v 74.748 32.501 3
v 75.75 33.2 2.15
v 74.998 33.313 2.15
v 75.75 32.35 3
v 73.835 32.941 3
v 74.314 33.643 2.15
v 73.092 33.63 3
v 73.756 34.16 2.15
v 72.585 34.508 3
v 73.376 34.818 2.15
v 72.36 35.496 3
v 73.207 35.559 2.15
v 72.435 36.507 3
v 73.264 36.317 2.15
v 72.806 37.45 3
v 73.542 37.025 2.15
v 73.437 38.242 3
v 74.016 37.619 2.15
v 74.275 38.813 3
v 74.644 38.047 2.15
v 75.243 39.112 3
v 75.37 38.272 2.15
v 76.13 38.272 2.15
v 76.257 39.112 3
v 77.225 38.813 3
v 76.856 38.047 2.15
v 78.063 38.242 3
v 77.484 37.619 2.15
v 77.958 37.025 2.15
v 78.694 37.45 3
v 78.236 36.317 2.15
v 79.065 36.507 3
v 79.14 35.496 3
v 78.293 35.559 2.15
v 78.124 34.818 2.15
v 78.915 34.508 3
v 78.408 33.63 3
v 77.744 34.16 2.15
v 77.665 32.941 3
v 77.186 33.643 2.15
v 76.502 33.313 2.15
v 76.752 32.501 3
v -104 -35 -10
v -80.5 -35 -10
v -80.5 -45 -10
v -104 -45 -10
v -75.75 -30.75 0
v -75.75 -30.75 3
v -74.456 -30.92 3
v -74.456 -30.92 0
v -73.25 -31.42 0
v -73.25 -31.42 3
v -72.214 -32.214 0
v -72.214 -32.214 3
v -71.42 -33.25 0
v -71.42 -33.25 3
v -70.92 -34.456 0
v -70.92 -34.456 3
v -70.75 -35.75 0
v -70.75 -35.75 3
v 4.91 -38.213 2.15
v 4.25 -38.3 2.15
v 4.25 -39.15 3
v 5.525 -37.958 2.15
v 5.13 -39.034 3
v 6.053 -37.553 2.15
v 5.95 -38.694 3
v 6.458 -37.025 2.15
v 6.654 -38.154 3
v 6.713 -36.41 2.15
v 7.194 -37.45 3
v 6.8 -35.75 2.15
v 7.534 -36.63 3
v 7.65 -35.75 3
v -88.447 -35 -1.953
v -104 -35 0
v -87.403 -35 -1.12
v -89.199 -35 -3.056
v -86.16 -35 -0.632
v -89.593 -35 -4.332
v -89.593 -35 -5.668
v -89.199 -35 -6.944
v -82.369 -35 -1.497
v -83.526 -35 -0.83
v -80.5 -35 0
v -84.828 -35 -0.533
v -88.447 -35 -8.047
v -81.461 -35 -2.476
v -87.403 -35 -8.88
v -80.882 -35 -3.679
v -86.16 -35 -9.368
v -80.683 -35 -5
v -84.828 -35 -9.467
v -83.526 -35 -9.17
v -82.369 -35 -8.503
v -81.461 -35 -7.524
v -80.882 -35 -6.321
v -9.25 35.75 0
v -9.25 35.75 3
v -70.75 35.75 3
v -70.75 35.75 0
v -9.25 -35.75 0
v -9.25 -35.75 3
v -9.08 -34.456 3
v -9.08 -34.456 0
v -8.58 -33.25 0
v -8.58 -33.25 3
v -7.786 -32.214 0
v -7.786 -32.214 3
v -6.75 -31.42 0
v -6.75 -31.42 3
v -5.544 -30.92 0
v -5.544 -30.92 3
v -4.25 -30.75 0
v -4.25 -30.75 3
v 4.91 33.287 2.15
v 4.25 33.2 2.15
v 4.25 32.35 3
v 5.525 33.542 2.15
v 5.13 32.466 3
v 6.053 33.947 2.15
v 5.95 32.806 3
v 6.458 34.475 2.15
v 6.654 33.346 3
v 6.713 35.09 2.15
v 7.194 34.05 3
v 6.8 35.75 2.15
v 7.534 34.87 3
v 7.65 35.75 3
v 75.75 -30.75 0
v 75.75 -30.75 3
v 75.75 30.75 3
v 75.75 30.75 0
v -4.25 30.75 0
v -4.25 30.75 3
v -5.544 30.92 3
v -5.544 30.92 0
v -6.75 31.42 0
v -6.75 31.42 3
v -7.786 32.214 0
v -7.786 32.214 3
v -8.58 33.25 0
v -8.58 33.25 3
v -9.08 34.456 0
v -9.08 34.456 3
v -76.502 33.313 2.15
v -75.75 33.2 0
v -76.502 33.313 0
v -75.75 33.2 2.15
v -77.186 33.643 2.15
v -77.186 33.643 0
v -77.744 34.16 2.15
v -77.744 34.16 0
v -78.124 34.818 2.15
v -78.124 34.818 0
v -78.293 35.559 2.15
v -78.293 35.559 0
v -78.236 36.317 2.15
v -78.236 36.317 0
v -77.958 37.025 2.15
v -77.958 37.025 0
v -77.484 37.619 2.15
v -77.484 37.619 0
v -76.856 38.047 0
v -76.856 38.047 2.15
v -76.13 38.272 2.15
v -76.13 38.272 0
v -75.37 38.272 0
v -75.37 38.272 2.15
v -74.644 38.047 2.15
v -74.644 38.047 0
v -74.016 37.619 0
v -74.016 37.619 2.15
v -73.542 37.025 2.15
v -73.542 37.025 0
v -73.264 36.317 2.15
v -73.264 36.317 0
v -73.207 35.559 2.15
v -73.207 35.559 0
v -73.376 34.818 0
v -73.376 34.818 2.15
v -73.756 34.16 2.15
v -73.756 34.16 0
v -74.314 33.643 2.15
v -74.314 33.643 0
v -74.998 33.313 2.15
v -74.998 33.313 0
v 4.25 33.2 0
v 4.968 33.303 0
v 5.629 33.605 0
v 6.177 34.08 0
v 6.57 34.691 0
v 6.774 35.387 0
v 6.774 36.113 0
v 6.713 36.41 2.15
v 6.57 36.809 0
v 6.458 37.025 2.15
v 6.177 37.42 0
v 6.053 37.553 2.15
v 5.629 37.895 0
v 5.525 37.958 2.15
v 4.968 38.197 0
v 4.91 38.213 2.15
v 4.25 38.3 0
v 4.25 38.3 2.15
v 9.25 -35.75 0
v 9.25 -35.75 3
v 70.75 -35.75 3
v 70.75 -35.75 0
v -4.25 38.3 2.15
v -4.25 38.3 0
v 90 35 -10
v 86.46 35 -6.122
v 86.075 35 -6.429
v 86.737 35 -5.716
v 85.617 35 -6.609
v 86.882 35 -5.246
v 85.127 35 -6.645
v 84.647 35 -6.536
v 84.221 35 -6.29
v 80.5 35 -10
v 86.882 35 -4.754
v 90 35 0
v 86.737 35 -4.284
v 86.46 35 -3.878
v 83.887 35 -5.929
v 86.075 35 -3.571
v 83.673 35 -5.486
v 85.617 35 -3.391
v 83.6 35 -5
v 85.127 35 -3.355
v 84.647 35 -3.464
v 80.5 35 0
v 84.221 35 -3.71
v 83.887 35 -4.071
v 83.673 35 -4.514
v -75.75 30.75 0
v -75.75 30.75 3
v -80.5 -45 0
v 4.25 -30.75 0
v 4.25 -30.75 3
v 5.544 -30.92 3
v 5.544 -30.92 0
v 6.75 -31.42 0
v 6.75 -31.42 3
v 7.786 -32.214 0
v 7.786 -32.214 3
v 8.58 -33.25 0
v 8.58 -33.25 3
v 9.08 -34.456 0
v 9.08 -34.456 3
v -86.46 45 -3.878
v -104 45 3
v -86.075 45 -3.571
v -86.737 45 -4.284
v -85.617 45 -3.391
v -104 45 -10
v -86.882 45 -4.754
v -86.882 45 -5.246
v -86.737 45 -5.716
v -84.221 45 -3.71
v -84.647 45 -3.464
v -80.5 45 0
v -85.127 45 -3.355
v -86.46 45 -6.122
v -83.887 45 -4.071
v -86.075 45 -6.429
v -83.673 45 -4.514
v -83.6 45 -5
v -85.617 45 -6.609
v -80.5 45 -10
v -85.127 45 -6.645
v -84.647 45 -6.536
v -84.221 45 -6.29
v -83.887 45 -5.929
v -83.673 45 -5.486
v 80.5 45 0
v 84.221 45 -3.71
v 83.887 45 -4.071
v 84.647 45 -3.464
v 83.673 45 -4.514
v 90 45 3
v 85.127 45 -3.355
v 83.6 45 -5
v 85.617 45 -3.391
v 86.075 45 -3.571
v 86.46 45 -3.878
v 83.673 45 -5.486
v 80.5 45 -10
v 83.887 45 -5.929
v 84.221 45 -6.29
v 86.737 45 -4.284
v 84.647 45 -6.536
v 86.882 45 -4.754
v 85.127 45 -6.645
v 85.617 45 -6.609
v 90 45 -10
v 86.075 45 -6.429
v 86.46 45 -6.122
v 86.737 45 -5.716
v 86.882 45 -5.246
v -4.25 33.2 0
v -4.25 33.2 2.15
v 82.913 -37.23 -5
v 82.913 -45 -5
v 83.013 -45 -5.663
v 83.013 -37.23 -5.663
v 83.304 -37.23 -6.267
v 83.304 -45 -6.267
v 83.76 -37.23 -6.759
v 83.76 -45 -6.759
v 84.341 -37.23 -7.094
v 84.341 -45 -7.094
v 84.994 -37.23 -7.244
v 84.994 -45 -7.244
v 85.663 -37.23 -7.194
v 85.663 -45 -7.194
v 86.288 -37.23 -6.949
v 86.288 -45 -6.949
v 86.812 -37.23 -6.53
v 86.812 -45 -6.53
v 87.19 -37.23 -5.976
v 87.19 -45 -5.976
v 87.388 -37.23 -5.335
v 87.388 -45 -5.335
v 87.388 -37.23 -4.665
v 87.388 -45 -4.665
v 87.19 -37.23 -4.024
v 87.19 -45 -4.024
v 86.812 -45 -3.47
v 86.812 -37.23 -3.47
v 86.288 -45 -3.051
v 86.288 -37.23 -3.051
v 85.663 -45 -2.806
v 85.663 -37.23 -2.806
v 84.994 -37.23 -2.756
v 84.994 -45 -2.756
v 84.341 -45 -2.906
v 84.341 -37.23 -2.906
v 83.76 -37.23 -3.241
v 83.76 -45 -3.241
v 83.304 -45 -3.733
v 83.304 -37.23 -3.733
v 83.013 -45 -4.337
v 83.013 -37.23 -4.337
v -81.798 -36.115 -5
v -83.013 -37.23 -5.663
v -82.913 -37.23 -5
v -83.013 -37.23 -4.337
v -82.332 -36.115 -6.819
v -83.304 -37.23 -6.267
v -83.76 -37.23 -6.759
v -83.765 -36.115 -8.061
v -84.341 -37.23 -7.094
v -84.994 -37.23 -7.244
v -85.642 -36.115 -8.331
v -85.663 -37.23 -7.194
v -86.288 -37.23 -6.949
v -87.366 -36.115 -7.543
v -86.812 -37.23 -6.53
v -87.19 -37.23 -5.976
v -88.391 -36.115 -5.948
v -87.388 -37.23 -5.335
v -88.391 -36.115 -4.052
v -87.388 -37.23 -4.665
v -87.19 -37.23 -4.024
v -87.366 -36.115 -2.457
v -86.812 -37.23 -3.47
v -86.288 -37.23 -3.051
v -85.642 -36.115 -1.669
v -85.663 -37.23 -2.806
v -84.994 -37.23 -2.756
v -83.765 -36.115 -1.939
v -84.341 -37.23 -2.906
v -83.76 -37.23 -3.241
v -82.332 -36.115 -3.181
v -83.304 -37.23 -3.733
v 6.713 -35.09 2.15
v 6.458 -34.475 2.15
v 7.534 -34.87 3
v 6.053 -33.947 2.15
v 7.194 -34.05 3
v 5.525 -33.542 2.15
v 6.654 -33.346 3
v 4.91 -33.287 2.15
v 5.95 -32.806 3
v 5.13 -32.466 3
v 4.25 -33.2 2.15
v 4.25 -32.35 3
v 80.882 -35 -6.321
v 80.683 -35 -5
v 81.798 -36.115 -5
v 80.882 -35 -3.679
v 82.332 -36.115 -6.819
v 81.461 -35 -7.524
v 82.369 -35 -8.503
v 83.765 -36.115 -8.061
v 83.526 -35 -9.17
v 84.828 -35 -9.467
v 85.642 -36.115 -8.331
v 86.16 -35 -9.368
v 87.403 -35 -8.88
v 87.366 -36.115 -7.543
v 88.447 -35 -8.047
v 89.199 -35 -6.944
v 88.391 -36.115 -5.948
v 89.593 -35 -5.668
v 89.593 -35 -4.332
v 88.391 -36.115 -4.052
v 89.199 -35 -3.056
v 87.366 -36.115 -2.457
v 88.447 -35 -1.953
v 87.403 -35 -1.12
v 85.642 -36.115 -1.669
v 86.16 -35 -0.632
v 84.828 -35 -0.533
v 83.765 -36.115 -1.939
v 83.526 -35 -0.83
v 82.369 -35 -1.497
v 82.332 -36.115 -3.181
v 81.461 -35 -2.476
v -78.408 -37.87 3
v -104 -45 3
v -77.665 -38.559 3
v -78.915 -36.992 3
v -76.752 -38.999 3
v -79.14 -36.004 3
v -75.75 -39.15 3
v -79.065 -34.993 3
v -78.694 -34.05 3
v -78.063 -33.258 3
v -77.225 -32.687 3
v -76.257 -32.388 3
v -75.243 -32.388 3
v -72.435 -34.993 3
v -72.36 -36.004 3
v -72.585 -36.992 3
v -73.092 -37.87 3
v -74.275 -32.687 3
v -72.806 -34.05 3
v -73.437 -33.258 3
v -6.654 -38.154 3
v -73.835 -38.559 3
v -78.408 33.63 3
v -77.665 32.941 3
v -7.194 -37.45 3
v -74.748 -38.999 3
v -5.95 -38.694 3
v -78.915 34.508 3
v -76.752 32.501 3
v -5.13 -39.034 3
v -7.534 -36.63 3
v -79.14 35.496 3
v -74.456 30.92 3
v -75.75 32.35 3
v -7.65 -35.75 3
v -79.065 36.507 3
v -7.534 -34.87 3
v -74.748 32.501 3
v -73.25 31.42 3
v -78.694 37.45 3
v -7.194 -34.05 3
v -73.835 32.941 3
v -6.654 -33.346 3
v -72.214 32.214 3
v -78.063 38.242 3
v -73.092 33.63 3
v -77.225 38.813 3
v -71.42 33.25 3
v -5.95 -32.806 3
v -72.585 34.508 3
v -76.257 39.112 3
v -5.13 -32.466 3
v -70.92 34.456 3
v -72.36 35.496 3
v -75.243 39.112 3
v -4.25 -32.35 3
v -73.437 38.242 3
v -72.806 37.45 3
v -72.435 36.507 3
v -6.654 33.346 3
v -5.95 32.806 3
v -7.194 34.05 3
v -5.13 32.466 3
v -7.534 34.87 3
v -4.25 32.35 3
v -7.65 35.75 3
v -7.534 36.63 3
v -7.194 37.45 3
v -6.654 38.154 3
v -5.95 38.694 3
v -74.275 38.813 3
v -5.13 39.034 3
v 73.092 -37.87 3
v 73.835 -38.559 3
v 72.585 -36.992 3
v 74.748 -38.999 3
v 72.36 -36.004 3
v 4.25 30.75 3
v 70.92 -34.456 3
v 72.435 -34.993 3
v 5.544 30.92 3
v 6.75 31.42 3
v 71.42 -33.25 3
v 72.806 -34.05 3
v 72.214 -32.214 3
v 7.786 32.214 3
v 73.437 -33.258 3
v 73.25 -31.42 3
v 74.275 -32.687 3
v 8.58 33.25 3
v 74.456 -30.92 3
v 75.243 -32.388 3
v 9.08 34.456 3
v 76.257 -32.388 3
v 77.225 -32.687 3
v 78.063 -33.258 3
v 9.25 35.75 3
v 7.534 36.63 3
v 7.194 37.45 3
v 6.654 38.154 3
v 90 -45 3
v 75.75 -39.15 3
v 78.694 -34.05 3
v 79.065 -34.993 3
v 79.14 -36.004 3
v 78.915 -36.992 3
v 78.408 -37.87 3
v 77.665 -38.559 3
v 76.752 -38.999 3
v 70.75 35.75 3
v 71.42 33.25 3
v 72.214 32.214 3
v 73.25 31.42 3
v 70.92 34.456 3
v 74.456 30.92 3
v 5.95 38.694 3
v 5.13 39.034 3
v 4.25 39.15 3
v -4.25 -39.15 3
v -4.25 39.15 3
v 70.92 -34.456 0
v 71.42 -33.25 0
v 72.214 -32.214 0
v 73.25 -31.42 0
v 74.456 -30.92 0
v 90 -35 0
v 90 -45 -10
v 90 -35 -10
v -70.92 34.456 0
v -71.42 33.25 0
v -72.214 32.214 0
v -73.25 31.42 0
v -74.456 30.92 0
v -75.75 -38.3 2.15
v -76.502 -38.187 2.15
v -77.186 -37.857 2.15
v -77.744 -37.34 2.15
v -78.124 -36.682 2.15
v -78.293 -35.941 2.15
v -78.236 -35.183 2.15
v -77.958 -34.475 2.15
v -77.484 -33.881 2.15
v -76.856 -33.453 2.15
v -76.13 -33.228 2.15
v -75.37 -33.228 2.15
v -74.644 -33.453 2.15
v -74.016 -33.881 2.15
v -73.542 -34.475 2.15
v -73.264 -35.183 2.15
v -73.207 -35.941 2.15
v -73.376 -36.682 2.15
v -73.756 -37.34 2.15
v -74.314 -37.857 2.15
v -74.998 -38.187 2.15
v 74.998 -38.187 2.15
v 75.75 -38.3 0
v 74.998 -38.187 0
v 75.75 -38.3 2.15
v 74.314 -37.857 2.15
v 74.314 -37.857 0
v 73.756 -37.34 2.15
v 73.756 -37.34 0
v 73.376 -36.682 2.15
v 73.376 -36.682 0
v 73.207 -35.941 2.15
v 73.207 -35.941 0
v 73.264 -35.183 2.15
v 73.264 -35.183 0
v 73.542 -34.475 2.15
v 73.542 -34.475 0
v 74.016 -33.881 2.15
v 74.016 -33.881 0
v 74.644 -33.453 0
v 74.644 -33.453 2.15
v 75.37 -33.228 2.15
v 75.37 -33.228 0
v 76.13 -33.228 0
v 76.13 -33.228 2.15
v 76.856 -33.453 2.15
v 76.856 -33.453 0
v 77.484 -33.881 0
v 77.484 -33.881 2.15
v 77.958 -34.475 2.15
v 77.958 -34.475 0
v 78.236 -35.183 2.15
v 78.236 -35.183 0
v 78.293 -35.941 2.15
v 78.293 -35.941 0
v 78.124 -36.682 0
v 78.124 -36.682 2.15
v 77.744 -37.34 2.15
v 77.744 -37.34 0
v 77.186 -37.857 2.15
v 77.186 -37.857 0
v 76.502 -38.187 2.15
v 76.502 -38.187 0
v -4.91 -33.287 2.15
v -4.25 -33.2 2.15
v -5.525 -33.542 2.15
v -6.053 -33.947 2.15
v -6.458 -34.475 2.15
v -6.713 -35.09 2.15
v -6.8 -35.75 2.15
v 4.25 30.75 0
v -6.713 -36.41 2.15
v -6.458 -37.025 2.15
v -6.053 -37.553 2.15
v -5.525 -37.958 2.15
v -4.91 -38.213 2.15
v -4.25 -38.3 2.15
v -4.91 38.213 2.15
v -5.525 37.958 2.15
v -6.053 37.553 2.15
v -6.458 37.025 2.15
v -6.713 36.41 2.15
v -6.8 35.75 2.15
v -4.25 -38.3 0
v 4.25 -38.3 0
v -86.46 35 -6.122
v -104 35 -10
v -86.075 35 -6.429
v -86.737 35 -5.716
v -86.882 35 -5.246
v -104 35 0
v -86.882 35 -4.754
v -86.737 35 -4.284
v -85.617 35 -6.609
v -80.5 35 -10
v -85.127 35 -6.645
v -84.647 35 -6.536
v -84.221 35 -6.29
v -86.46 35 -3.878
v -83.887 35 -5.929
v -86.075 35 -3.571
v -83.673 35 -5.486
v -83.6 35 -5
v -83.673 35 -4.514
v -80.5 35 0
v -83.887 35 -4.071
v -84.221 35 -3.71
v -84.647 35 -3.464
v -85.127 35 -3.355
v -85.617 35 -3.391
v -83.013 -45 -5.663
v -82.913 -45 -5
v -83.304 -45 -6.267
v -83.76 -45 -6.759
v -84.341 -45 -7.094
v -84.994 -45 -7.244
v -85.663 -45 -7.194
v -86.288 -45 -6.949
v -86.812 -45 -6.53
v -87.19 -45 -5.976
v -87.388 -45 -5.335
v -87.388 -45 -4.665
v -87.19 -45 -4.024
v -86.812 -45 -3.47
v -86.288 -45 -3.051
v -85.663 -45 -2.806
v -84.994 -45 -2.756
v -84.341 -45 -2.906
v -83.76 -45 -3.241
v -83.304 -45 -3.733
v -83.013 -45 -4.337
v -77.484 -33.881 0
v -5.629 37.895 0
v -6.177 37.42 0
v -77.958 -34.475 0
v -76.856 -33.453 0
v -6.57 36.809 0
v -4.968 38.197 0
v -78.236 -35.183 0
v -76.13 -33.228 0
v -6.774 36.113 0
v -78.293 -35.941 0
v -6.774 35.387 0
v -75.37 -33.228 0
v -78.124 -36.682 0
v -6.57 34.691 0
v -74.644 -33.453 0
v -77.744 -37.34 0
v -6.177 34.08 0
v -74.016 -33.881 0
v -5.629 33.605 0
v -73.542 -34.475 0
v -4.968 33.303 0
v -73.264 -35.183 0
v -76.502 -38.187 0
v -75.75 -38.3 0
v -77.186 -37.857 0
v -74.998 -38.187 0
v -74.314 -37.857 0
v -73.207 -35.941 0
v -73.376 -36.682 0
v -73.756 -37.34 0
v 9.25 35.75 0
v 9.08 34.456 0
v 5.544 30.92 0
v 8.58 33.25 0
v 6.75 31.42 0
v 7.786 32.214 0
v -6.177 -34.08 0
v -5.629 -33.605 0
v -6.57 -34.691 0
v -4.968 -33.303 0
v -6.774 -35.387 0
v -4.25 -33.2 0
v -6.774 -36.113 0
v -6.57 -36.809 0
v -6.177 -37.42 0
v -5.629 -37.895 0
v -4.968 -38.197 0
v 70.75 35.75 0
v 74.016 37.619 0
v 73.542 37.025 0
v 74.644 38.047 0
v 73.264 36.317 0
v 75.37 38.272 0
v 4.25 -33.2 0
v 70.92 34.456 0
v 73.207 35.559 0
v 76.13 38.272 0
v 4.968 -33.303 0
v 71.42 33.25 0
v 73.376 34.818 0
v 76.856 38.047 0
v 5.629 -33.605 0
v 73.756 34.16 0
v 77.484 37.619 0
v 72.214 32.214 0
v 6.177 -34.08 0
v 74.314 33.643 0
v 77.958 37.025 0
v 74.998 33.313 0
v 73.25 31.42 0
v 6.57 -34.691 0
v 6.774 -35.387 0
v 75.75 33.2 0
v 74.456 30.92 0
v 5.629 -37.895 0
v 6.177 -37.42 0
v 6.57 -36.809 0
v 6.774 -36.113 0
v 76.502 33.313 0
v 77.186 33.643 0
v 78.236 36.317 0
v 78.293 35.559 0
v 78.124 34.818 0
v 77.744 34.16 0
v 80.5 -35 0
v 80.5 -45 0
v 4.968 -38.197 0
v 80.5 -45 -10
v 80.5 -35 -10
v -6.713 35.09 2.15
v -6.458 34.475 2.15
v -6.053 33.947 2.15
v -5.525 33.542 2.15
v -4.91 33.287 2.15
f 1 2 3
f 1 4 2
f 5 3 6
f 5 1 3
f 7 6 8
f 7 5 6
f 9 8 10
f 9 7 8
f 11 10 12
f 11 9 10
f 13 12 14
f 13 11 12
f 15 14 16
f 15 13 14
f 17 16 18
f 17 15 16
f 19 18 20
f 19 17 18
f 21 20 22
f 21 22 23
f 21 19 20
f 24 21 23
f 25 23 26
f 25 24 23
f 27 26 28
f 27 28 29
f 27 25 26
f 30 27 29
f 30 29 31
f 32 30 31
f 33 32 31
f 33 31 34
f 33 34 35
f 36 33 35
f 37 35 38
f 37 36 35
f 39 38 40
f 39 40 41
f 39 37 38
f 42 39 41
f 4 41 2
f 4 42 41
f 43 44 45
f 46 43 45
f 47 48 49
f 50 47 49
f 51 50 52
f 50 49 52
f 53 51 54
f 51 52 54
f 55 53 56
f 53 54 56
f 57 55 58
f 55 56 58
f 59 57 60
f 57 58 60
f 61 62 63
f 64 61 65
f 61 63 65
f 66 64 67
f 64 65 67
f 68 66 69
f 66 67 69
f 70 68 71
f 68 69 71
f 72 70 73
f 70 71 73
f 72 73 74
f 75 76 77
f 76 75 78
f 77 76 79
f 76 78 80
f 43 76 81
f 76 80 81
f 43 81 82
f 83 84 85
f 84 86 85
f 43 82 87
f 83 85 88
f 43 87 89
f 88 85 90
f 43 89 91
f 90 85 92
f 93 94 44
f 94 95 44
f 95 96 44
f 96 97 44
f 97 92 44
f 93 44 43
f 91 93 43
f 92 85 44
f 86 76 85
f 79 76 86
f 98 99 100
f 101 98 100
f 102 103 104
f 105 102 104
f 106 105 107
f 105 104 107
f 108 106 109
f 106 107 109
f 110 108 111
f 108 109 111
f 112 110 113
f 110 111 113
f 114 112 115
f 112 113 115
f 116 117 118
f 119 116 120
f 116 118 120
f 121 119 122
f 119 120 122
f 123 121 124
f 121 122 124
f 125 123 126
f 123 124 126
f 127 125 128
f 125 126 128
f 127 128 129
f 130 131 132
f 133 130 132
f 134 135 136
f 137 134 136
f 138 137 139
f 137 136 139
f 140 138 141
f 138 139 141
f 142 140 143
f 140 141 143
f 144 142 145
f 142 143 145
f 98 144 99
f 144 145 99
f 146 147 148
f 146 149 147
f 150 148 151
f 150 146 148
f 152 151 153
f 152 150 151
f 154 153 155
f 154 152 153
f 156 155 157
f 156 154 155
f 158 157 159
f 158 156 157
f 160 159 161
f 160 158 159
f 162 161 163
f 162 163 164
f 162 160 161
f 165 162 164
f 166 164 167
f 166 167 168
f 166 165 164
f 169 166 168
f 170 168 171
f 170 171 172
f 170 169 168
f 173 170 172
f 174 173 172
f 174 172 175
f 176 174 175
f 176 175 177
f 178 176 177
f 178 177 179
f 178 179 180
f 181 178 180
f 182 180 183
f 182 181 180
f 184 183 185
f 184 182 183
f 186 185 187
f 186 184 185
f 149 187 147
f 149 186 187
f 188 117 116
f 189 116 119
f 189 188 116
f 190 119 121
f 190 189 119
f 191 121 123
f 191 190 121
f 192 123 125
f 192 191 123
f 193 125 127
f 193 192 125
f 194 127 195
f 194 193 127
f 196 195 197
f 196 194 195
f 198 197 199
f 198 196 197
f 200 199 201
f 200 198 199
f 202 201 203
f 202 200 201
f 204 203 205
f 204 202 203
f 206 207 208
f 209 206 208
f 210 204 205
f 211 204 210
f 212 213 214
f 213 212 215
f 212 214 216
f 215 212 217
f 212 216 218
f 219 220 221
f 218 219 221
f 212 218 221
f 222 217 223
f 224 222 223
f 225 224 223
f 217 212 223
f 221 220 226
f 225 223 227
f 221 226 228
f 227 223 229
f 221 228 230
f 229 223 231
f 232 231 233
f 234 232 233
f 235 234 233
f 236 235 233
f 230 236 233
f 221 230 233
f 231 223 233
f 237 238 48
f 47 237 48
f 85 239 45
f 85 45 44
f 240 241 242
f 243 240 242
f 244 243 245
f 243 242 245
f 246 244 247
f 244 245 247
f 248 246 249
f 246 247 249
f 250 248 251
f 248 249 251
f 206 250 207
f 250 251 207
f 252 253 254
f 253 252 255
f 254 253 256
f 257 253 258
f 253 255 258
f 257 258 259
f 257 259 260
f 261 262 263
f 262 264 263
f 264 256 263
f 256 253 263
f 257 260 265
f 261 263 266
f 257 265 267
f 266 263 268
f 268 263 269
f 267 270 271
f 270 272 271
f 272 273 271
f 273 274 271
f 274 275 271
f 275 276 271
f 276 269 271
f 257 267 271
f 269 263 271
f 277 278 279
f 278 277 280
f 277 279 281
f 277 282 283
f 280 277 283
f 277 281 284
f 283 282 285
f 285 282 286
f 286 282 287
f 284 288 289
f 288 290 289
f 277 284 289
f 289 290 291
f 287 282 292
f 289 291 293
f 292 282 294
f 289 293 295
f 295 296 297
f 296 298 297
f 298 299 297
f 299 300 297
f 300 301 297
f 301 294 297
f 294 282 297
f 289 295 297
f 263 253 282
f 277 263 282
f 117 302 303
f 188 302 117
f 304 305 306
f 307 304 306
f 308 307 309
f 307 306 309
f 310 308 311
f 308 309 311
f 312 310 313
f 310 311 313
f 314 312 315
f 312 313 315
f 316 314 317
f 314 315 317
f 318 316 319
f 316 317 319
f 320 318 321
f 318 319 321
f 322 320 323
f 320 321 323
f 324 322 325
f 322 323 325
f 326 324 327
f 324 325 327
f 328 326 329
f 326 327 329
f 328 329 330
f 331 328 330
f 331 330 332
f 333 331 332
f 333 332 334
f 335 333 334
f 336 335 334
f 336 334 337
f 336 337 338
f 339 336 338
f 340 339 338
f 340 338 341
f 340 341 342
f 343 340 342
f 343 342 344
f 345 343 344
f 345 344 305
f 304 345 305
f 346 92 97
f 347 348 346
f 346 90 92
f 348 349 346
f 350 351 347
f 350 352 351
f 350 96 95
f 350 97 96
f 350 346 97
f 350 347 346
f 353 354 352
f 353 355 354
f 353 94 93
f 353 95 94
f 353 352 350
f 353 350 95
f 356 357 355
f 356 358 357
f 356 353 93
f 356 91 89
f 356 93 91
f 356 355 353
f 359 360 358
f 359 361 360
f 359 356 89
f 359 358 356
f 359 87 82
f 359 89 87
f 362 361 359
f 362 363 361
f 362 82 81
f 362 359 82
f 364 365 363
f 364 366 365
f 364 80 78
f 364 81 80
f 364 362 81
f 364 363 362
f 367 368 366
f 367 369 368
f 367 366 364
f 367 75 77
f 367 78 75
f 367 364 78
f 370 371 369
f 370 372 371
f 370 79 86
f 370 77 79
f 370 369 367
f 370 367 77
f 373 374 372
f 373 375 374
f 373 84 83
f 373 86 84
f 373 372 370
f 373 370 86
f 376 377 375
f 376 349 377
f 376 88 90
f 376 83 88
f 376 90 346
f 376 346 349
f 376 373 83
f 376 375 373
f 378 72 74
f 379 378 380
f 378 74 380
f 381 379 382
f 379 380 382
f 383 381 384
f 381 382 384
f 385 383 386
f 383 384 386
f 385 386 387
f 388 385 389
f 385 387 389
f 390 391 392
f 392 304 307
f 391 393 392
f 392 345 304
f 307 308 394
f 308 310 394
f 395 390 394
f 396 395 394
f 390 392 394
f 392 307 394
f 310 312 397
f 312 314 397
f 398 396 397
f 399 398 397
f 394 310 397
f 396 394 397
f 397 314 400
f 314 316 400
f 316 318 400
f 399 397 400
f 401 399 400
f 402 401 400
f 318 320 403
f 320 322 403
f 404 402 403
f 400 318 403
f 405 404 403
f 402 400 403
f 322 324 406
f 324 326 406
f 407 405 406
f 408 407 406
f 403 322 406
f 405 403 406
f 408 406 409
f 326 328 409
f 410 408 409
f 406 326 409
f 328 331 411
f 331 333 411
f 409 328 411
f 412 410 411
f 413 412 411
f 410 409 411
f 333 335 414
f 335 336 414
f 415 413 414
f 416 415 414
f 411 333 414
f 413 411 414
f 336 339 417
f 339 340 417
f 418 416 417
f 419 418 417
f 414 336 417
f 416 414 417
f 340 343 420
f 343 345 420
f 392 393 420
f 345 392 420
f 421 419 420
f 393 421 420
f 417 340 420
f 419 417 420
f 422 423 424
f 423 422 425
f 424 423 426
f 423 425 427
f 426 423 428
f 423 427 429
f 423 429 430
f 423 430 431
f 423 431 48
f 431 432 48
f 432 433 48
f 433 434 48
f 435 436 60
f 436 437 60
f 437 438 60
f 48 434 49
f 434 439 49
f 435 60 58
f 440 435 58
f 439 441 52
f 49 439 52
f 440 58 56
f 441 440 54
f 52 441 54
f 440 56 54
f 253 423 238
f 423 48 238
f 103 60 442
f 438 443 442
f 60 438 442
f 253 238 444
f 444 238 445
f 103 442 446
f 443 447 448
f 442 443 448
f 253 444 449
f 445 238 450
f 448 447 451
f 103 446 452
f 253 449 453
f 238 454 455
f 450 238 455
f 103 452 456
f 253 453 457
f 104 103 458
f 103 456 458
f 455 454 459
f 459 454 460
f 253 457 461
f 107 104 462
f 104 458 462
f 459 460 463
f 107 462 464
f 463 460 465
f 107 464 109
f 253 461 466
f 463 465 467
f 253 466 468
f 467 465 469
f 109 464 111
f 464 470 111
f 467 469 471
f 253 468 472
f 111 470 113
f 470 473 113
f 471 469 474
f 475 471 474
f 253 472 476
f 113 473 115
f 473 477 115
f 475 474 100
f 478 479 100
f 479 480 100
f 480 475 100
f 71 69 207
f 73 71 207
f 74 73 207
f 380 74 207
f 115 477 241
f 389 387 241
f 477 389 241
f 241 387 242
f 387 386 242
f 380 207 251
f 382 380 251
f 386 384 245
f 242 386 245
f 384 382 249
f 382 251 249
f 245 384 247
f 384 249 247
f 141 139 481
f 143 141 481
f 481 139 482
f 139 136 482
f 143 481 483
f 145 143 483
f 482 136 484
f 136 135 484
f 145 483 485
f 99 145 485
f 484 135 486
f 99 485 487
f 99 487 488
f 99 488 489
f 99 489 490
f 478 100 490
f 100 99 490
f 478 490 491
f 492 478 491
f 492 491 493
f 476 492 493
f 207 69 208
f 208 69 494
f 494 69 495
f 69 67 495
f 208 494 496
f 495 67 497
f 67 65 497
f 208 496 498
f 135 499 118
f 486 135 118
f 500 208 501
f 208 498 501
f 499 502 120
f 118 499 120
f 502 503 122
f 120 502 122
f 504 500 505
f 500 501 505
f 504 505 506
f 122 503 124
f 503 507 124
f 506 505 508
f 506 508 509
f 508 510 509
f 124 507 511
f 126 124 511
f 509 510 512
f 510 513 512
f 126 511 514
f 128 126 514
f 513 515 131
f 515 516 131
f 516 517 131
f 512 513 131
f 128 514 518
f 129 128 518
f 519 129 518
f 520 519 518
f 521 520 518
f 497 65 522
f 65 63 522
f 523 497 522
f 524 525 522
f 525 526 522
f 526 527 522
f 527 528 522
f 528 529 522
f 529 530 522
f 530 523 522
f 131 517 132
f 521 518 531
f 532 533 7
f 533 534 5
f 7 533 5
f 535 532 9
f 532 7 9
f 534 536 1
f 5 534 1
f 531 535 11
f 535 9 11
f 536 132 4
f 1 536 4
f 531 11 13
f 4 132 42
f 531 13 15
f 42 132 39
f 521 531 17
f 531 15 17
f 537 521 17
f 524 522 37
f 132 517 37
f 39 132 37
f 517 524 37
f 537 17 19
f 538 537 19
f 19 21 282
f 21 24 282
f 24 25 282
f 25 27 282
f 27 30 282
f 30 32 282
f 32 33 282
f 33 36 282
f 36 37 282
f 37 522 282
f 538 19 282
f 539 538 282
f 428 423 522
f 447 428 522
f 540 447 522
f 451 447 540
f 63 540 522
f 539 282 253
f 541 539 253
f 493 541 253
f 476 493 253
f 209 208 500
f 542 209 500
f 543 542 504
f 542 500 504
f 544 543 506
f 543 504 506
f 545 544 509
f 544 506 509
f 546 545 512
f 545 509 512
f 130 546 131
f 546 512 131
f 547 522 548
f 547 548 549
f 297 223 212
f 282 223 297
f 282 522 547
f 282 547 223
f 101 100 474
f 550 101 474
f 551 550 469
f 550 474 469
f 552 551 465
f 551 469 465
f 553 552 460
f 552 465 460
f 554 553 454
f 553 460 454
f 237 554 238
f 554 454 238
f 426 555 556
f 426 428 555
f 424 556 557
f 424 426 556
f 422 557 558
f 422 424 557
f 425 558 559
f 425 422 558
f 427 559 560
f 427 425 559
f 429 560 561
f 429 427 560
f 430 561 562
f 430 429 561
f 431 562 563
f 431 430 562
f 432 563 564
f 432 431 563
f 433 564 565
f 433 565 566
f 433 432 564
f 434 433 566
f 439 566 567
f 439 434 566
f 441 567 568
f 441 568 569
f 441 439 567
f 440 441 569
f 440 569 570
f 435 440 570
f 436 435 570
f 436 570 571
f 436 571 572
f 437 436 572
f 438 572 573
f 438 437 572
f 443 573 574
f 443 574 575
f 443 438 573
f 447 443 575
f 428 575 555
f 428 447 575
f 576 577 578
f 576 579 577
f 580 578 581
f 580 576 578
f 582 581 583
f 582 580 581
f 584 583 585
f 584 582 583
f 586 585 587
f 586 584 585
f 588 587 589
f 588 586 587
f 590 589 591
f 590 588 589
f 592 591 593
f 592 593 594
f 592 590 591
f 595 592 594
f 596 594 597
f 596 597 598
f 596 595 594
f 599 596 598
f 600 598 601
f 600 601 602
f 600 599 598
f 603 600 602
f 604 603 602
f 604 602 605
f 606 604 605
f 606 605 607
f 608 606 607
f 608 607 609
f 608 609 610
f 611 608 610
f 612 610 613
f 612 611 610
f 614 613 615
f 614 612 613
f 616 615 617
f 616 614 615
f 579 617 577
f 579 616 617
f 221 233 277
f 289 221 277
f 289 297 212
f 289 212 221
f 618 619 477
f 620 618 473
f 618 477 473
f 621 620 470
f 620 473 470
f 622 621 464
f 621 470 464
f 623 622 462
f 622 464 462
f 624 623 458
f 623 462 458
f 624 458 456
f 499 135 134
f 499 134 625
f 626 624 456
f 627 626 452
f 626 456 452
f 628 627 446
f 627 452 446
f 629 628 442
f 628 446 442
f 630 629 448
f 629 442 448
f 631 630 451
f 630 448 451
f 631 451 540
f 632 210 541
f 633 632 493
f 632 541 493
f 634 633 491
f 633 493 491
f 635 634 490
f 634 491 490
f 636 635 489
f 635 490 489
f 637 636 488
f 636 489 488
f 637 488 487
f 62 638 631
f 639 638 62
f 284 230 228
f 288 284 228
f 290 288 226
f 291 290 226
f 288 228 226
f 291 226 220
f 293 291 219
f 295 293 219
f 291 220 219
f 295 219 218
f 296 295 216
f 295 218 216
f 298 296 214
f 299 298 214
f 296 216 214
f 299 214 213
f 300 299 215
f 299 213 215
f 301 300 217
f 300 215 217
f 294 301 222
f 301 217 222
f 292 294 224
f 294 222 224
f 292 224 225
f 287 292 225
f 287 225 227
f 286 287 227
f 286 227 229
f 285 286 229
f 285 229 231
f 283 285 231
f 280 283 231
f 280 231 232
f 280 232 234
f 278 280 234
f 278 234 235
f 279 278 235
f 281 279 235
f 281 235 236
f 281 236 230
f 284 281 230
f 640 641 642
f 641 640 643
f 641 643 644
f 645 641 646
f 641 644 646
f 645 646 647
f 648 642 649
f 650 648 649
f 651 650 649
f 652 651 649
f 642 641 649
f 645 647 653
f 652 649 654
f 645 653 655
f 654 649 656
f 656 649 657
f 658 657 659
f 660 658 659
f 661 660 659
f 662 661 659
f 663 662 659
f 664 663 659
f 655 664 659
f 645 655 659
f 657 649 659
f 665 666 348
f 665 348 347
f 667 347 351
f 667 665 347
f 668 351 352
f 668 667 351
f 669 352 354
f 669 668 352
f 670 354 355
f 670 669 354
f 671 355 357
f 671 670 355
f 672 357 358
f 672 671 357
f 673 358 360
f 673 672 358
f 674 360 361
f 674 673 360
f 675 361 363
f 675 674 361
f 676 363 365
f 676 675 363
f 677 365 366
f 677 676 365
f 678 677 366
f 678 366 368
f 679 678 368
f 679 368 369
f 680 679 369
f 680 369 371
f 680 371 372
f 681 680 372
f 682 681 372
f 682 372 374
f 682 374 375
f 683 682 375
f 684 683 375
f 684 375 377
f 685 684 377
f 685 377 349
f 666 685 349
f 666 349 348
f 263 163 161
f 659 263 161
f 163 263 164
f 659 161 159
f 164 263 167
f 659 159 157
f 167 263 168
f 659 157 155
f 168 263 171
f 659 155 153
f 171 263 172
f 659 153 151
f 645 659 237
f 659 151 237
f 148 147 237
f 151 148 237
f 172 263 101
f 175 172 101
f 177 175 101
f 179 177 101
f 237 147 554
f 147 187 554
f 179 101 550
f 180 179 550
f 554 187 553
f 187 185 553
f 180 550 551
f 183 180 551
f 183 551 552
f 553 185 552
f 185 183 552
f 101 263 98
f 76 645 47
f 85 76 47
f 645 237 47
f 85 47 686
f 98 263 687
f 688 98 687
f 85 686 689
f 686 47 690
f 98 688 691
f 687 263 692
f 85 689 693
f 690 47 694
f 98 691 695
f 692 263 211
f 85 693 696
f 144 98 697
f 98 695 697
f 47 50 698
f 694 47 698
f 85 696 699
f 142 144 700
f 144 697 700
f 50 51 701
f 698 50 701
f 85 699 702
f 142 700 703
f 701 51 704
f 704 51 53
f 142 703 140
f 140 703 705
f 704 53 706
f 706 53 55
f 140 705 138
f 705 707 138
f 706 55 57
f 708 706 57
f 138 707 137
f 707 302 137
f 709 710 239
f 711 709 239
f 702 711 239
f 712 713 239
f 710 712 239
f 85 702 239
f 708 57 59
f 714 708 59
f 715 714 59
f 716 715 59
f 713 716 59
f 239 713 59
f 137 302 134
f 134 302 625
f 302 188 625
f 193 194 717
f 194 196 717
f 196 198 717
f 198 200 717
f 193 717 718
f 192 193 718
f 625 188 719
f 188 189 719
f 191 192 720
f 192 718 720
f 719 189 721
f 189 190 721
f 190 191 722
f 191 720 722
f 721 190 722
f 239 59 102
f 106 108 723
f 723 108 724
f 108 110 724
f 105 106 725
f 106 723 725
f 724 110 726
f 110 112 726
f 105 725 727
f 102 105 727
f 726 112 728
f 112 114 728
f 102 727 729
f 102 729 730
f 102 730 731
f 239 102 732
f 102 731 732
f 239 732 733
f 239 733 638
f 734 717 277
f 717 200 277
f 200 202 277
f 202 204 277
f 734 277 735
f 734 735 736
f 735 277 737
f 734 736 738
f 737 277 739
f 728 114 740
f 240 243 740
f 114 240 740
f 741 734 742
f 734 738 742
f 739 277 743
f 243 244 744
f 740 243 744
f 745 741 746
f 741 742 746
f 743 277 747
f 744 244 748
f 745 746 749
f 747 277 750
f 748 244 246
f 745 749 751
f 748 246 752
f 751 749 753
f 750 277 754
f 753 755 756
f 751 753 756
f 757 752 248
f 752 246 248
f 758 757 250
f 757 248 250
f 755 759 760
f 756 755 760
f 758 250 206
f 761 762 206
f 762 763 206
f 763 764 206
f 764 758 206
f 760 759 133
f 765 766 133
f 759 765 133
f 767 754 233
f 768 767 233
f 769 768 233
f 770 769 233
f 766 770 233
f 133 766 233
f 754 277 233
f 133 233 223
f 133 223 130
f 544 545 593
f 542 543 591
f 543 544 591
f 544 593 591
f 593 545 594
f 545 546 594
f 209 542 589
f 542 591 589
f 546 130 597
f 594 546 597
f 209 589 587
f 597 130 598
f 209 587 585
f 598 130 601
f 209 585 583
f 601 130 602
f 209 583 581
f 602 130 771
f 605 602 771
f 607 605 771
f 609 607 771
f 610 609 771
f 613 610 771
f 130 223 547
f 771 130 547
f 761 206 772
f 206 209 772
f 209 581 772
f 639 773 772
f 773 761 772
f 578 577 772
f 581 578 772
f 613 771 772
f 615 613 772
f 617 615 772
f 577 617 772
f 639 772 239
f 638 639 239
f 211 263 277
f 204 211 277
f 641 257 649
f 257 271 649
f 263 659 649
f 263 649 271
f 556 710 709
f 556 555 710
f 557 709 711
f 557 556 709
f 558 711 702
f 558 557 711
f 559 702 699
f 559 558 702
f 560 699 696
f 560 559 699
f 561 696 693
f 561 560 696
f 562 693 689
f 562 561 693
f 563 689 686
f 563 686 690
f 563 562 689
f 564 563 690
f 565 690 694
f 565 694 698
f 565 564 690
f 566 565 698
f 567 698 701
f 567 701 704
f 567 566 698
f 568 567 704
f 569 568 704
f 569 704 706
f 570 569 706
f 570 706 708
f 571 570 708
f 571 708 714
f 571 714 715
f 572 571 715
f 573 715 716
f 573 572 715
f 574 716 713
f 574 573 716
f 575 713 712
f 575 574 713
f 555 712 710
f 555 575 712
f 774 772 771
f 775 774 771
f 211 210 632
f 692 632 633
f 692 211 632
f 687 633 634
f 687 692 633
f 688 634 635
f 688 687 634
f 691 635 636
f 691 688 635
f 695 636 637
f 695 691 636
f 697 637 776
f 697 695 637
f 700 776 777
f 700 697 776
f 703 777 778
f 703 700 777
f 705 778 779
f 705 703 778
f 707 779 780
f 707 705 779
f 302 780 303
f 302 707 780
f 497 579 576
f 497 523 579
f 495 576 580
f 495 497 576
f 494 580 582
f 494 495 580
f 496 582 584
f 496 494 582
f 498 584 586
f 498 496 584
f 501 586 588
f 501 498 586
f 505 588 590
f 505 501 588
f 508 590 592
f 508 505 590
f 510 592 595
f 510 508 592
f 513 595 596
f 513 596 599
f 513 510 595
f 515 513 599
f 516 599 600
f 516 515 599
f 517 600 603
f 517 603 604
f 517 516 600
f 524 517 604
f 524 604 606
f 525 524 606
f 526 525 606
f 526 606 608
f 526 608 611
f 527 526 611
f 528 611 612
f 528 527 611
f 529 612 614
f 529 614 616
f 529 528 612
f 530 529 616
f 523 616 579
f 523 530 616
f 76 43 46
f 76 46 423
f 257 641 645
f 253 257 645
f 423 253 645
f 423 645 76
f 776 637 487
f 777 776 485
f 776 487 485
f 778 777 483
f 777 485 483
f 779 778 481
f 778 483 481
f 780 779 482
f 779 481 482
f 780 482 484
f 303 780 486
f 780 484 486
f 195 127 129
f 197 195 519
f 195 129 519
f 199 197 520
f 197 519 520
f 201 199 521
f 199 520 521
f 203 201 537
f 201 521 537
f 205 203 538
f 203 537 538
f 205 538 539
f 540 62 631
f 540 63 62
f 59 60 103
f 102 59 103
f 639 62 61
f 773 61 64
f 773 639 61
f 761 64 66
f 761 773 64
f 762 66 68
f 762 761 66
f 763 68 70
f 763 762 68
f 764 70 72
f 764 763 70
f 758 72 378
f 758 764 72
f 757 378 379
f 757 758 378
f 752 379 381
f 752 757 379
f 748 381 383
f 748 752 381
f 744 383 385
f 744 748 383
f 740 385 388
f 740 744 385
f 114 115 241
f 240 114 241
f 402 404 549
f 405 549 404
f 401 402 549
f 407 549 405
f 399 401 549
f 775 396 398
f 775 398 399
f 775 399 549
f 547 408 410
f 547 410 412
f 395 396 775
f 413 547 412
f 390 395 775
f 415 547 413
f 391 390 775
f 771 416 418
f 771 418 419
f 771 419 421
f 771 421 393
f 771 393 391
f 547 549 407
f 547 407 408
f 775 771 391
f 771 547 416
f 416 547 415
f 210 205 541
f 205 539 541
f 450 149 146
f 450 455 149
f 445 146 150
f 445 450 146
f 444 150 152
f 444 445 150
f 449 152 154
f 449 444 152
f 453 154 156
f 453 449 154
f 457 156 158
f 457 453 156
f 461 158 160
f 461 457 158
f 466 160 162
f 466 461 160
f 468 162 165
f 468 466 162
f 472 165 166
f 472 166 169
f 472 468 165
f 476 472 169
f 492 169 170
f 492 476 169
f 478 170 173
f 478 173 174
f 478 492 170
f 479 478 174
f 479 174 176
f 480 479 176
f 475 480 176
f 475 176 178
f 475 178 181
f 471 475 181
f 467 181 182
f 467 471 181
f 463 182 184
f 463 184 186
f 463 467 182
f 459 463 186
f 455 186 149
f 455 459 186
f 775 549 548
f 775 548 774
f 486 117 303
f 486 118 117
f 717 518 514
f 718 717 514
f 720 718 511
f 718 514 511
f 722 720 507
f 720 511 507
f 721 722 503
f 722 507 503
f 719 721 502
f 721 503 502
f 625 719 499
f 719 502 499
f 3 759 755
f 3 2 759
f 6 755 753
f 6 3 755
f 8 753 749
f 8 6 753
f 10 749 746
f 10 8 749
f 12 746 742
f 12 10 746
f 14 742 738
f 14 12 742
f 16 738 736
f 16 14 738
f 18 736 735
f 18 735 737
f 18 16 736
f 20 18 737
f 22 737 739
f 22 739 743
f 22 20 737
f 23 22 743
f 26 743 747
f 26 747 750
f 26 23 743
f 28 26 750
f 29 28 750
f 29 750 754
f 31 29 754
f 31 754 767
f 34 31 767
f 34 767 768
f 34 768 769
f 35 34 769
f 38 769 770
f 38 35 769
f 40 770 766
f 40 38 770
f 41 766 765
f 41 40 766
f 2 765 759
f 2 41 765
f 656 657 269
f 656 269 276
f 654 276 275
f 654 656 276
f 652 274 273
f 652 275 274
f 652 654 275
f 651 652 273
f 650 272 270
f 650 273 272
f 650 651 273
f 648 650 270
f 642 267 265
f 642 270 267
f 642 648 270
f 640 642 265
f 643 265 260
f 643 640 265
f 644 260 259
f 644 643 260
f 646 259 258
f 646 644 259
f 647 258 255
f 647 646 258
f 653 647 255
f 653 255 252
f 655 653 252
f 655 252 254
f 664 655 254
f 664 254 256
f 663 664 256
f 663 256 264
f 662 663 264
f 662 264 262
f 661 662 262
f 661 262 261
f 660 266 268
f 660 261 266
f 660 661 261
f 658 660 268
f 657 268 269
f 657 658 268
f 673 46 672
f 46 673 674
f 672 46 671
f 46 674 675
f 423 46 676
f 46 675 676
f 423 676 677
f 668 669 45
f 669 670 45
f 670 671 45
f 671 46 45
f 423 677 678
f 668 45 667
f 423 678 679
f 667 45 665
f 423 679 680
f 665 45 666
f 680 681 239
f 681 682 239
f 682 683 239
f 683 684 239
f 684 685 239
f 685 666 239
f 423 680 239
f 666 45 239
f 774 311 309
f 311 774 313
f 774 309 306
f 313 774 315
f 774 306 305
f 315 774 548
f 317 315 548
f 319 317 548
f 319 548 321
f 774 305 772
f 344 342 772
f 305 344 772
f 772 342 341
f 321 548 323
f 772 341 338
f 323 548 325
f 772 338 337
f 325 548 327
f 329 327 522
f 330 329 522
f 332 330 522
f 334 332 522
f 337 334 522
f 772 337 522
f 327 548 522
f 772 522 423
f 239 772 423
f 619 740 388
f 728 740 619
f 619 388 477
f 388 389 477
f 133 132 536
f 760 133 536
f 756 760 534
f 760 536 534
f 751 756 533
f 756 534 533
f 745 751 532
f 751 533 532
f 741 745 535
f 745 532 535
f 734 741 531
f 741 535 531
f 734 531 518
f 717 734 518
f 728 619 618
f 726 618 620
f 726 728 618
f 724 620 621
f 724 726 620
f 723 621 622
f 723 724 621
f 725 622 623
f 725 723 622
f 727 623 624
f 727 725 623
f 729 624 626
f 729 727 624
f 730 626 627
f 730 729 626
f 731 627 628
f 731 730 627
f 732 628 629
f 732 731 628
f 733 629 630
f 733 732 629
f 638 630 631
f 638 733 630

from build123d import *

# Parameters (mm, degrees)
SKETCH3_W                                      = 180
SKETCH3_H                                      = 90
BOSS_EXTRUDE3_DEPTH                            = 3
SKETCH4_W                                      = 8.5
SKETCH4_H                                      = 61.5
CUT_EXTRUDE1_DEPTH                             = 3
CSK_FOR_M5_FLAT_HEAD_MACHINE_SCREW1_AT_2_COUNT = 2
CSK_FOR_M5_FLAT_HEAD_MACHINE_SCREW1_AT_2_PITCH = 167.524625056
CSK_FOR_M5_FLAT_HEAD_MACHINE_SCREW1_AT_3_COUNT = 2
CSK_FOR_M5_FLAT_HEAD_MACHINE_SCREW1_AT_3_PITCH = 71.5
CSK_FOR_M5_FLAT_HEAD_MACHINE_SCREW1_AT_4_COUNT = 2
CSK_FOR_M5_FLAT_HEAD_MACHINE_SCREW1_AT_4_PITCH = 151.5
CSK_SLOT_FOR_M5_FLAT_HEAD_MACHINE_SCREW1_DEPTH = 3
SKETCH12_W                                     = 9.5
SKETCH12_H                                     = 10
BOSS_EXTRUDE4_DEPTH                            = 10
CSK_FOR_M4_SFHCS1_D                            = 4.5
CSK_FOR_M4_SFHCS1_DEPTH                        = 10
CSK_FOR_M4_SFHCS1_CSINK_D                      = 8.96
CSK_FOR_M4_SFHCS1_CSINK_ANGLE                  = 90
M4X0_7_TAPPED_HOLE1_D                          = 3.3
BOSS_EXTRUDE5_DEPTH                            = 14


with BuildPart() as part:
    # Sketch3 → Boss-Extrude3 (new body)
    with BuildSketch(Plane.XY):
        Rectangle(SKETCH3_W, SKETCH3_H)
    extrude(amount=BOSS_EXTRUDE3_DEPTH)

    # Sketch4 → Cut-Extrude1 (cut)
    with BuildSketch(Plane.XY.offset(3)):
        with BuildLine():
            Line((-4.25, -30.75), (-4.25, 30.75))
            ThreePointArc((-4.25, 30.75), (-7.785533906, 32.214466094), (-9.25, 35.75))
            Line((-9.25, 35.75), (-70.75, 35.75))
            ThreePointArc((-70.75, 35.75), (-72.214466094, 32.214466094), (-75.75, 30.75))
            Line((-75.75, 30.75), (-75.75, -30.75))
            ThreePointArc((-75.75, -30.75), (-72.214466094, -32.214466094), (-70.75, -35.75))
            Line((-70.75, -35.75), (-9.25, -35.75))
            ThreePointArc((-9.25, -35.75), (-7.785533906, -32.214466094), (-4.25, -30.75))
        make_face()
        Rectangle(SKETCH4_W, SKETCH4_H)
        with BuildLine():
            ThreePointArc((9.25, 35.75), (7.785533906, 32.214466094), (4.25, 30.75))
            Line((4.25, 30.75), (4.25, -30.75))
            ThreePointArc((4.25, -30.75), (7.785533906, -32.214466094), (9.25, -35.75))
            Line((9.25, -35.75), (70.75, -35.75))
            ThreePointArc((70.75, -35.75), (72.214466094, -32.214466094), (75.75, -30.75))
            Line((75.75, -30.75), (75.75, 30.75))
            ThreePointArc((75.75, 30.75), (72.214466094, 32.214466094), (70.75, 35.75))
            Line((70.75, 35.75), (9.25, 35.75))
        make_face()
    extrude(amount=-CUT_EXTRUDE1_DEPTH, mode=Mode.SUBTRACT)

    # Sketch8 → CSK for M5 Flat Head Machine Screw1 (revolve, cut)
    with BuildSketch(Plane(origin=(-75.75, 35.75, 3), x_dir=(0, -1, 0), z_dir=(1, 0, 0))):
        Polygon((0, 0), (0, 3), (2.55, 3), (2.55, 0.85), (3.4, 0), align=None)
    csk_for_m5_flat_head_machine_screw1 = revolve(axis=Axis((-75.75, 35.75, 9.35), (0, 0, -1)), mode=Mode.SUBTRACT)

    # CSK for M5 Flat Head Machine Screw1 at 2: CSK for M5 Flat Head Machine Screw1 ×2
    with Locations(*[Vector(0.9043446594777974, -0.4268029251000826, 0) * (i * CSK_FOR_M5_FLAT_HEAD_MACHINE_SCREW1_AT_2_PITCH) for i in range(1, CSK_FOR_M5_FLAT_HEAD_MACHINE_SCREW1_AT_2_COUNT)]):
        add(csk_for_m5_flat_head_machine_screw1, mode=Mode.SUBTRACT)

    # CSK for M5 Flat Head Machine Screw1 at 3: CSK for M5 Flat Head Machine Screw1 ×2
    with Locations(*[(0, -i * CSK_FOR_M5_FLAT_HEAD_MACHINE_SCREW1_AT_3_PITCH, 0) for i in range(1, CSK_FOR_M5_FLAT_HEAD_MACHINE_SCREW1_AT_3_COUNT)]):
        add(csk_for_m5_flat_head_machine_screw1, mode=Mode.SUBTRACT)

    # CSK for M5 Flat Head Machine Screw1 at 4: CSK for M5 Flat Head Machine Screw1 ×2
    with Locations(*[(i * CSK_FOR_M5_FLAT_HEAD_MACHINE_SCREW1_AT_4_PITCH, 0, 0) for i in range(1, CSK_FOR_M5_FLAT_HEAD_MACHINE_SCREW1_AT_4_COUNT)]):
        add(csk_for_m5_flat_head_machine_screw1, mode=Mode.SUBTRACT)

    # CSK SLOT for M5 Flat Head Machine Screw1: read off the stored shape, not the designer's step
    # CSK SLOT for M5 Flat Head Machine Sc 2 → CSK SLOT for M5 Flat Head Machine Screw1 (cut)
    with BuildSketch(Plane.XY):
        with BuildLine():
            Line((-4.25, 33.2), (4.25, 33.2))
            ThreePointArc((4.25, 33.2), (6.8, 35.75), (4.25, 38.3))
            Line((4.25, 38.3), (-4.25, 38.3))
            ThreePointArc((-4.25, 38.3), (-6.8, 35.75), (-4.25, 33.2))
        make_face()
        with BuildLine():
            Line((-4.25, -38.3), (4.25, -38.3))
            ThreePointArc((4.25, -38.3), (6.8, -35.75), (4.25, -33.2))
            Line((4.25, -33.2), (-4.25, -33.2))
            ThreePointArc((-4.25, -33.2), (-6.8, -35.75), (-4.25, -38.3))
        make_face()
    extrude(amount=CSK_SLOT_FOR_M5_FLAT_HEAD_MACHINE_SCREW1_DEPTH, mode=Mode.SUBTRACT)

    # CSK SLOT for M5 Flat Head Machine Sc 3: loft between two sections, ruled curve by curve
    csk_slot_for_m5_flat_head_machine_sc_3_from = [
        Edge.make_three_point_arc((4.25, 33.2, 2.15), (6.053122292, 33.946877708, 2.15), (6.8, 35.75, 2.15)),
        Edge.make_three_point_arc((6.8, 35.75, 2.15), (6.053122292, 37.553122292, 2.15), (4.25, 38.3, 2.15)),
        Edge.make_three_point_arc((-4.25, 38.3, 2.15), (-6.053122292, 37.553122292, 2.15), (-6.8, 35.75, 2.15)),
        Edge.make_three_point_arc((-6.8, 35.75, 2.15), (-6.053122292, 33.946877708, 2.15), (-4.25, 33.2, 2.15)),
        Edge.make_line((4.25, 38.3, 2.15), (-4.25, 38.3, 2.15)),
        Edge.make_line((4.25, 33.2, 2.15), (-4.25, 33.2, 2.15)),
    ]
    csk_slot_for_m5_flat_head_machine_sc_3_to = [
        Edge.make_three_point_arc((4.25, 32.35, 3), (6.654163056, 33.345836944, 3), (7.65, 35.75, 3)),
        Edge.make_three_point_arc((7.65, 35.75, 3), (6.654163056, 38.154163056, 3), (4.25, 39.15, 3)),
        Edge.make_three_point_arc((-4.25, 39.15, 3), (-6.654163056, 38.154163056, 3), (-7.65, 35.75, 3)),
        Edge.make_three_point_arc((-7.65, 35.75, 3), (-6.654163056, 33.345836944, 3), (-4.25, 32.35, 3)),
        Edge.make_line((4.25, 39.15, 3), (-4.25, 39.15, 3)),
        Edge.make_line((4.25, 32.35, 3), (-4.25, 32.35, 3)),
    ]
    csk_slot_for_m5_flat_head_machine_sc_3 = Solid(Shell([*[Face.make_surface_from_curves(csk_slot_for_m5_flat_head_machine_sc_3_from[k], csk_slot_for_m5_flat_head_machine_sc_3_to[k]) for k in range(6)], Face(Wire(csk_slot_for_m5_flat_head_machine_sc_3_from)), Face(Wire(csk_slot_for_m5_flat_head_machine_sc_3_to))]))
    add(csk_slot_for_m5_flat_head_machine_sc_3, mode=Mode.SUBTRACT)

    # CSK SLOT for M5 Flat Head Machine Sc 4: loft between two sections, ruled curve by curve
    csk_slot_for_m5_flat_head_machine_sc_4_from = [
        Edge.make_three_point_arc((4.25, -38.3, 2.15), (6.053122292, -37.553122292, 2.15), (6.8, -35.75, 2.15)),
        Edge.make_three_point_arc((6.8, -35.75, 2.15), (6.053122292, -33.946877708, 2.15), (4.25, -33.2, 2.15)),
        Edge.make_three_point_arc((-4.25, -33.2, 2.15), (-6.053122292, -33.946877708, 2.15), (-6.8, -35.75, 2.15)),
        Edge.make_three_point_arc((-6.8, -35.75, 2.15), (-6.053122292, -37.553122292, 2.15), (-4.25, -38.3, 2.15)),
        Edge.make_line((4.25, -33.2, 2.15), (-4.25, -33.2, 2.15)),
        Edge.make_line((4.25, -38.3, 2.15), (-4.25, -38.3, 2.15)),
    ]
    csk_slot_for_m5_flat_head_machine_sc_4_to = [
        Edge.make_three_point_arc((4.25, -39.15, 3), (6.654163056, -38.154163056, 3), (7.65, -35.75, 3)),
        Edge.make_three_point_arc((7.65, -35.75, 3), (6.654163056, -33.345836944, 3), (4.25, -32.35, 3)),
        Edge.make_three_point_arc((-4.25, -32.35, 3), (-6.654163056, -33.345836944, 3), (-7.65, -35.75, 3)),
        Edge.make_three_point_arc((-7.65, -35.75, 3), (-6.654163056, -38.154163056, 3), (-4.25, -39.15, 3)),
        Edge.make_line((4.25, -32.35, 3), (-4.25, -32.35, 3)),
        Edge.make_line((4.25, -39.15, 3), (-4.25, -39.15, 3)),
    ]
    csk_slot_for_m5_flat_head_machine_sc_4 = Solid(Shell([*[Face.make_surface_from_curves(csk_slot_for_m5_flat_head_machine_sc_4_from[k], csk_slot_for_m5_flat_head_machine_sc_4_to[k]) for k in range(6)], Face(Wire(csk_slot_for_m5_flat_head_machine_sc_4_from)), Face(Wire(csk_slot_for_m5_flat_head_machine_sc_4_to))]))
    add(csk_slot_for_m5_flat_head_machine_sc_4, mode=Mode.SUBTRACT)

    # Sketch12 → Boss-Extrude4 (add)
    with BuildSketch(Plane(origin=(0, 0, 0), x_dir=(-1, 0, 0), z_dir=(0, 0, -1))):
        with Locations((-85.25, 40)):
            Rectangle(SKETCH12_W, SKETCH12_H)
        with Locations((-85.25, -40)):
            Rectangle(SKETCH12_W, SKETCH12_H)
    boss_extrude4 = extrude(amount=BOSS_EXTRUDE4_DEPTH)

    # CSK for M4 SFHCS1
    with Locations(Plane(origin=(0, -35, 0), x_dir=(1, 0, 0), z_dir=(0, 1, 0))):
        with Locations((85.162636167, 5)):
            csk_for_m4_sfhcs1 = CounterSinkHole(CSK_FOR_M4_SFHCS1_D / 2, CSK_FOR_M4_SFHCS1_CSINK_D / 2, depth=CSK_FOR_M4_SFHCS1_DEPTH, counter_sink_angle=CSK_FOR_M4_SFHCS1_CSINK_ANGLE)

    # M4x0.7 Tapped Hole1 (through all)
    with Locations(Plane(origin=(0, 45, 0), x_dir=(1, 0, 0), z_dir=(0, 1, 0))):
        with Locations((85.25, 5)):
            m4x0_7_tapped_hole1 = Hole(M4X0_7_TAPPED_HOLE1_D / 2)

    # Mirror1: Boss-Extrude4, CSK for M4 SFHCS1, M4x0.7 Tapped Hole1 across plane
    add(boss_extrude4.mirror(Plane(origin=(0, 0, 0), x_dir=(0, 0, 1), z_dir=(1, 0, 0))))
    add(csk_for_m4_sfhcs1.mirror(Plane(origin=(0, 0, 0), x_dir=(0, 0, 1), z_dir=(1, 0, 0))), mode=Mode.SUBTRACT)
    add(m4x0_7_tapped_hole1.mirror(Plane(origin=(0, 0, 0), x_dir=(0, 0, 1), z_dir=(1, 0, 0))), mode=Mode.SUBTRACT)

    # Sketch20 → Boss-Extrude5 (add)
    with BuildSketch(Plane.ZY.offset(90)):
        Polygon((3, -45), (3, 45), (-10, 45), (-10, 35), (0, 35), (0, -35), (-10, -35), (-10, -45), align=None)
    extrude(amount=BOSS_EXTRUDE5_DEPTH)


solid = part.part
